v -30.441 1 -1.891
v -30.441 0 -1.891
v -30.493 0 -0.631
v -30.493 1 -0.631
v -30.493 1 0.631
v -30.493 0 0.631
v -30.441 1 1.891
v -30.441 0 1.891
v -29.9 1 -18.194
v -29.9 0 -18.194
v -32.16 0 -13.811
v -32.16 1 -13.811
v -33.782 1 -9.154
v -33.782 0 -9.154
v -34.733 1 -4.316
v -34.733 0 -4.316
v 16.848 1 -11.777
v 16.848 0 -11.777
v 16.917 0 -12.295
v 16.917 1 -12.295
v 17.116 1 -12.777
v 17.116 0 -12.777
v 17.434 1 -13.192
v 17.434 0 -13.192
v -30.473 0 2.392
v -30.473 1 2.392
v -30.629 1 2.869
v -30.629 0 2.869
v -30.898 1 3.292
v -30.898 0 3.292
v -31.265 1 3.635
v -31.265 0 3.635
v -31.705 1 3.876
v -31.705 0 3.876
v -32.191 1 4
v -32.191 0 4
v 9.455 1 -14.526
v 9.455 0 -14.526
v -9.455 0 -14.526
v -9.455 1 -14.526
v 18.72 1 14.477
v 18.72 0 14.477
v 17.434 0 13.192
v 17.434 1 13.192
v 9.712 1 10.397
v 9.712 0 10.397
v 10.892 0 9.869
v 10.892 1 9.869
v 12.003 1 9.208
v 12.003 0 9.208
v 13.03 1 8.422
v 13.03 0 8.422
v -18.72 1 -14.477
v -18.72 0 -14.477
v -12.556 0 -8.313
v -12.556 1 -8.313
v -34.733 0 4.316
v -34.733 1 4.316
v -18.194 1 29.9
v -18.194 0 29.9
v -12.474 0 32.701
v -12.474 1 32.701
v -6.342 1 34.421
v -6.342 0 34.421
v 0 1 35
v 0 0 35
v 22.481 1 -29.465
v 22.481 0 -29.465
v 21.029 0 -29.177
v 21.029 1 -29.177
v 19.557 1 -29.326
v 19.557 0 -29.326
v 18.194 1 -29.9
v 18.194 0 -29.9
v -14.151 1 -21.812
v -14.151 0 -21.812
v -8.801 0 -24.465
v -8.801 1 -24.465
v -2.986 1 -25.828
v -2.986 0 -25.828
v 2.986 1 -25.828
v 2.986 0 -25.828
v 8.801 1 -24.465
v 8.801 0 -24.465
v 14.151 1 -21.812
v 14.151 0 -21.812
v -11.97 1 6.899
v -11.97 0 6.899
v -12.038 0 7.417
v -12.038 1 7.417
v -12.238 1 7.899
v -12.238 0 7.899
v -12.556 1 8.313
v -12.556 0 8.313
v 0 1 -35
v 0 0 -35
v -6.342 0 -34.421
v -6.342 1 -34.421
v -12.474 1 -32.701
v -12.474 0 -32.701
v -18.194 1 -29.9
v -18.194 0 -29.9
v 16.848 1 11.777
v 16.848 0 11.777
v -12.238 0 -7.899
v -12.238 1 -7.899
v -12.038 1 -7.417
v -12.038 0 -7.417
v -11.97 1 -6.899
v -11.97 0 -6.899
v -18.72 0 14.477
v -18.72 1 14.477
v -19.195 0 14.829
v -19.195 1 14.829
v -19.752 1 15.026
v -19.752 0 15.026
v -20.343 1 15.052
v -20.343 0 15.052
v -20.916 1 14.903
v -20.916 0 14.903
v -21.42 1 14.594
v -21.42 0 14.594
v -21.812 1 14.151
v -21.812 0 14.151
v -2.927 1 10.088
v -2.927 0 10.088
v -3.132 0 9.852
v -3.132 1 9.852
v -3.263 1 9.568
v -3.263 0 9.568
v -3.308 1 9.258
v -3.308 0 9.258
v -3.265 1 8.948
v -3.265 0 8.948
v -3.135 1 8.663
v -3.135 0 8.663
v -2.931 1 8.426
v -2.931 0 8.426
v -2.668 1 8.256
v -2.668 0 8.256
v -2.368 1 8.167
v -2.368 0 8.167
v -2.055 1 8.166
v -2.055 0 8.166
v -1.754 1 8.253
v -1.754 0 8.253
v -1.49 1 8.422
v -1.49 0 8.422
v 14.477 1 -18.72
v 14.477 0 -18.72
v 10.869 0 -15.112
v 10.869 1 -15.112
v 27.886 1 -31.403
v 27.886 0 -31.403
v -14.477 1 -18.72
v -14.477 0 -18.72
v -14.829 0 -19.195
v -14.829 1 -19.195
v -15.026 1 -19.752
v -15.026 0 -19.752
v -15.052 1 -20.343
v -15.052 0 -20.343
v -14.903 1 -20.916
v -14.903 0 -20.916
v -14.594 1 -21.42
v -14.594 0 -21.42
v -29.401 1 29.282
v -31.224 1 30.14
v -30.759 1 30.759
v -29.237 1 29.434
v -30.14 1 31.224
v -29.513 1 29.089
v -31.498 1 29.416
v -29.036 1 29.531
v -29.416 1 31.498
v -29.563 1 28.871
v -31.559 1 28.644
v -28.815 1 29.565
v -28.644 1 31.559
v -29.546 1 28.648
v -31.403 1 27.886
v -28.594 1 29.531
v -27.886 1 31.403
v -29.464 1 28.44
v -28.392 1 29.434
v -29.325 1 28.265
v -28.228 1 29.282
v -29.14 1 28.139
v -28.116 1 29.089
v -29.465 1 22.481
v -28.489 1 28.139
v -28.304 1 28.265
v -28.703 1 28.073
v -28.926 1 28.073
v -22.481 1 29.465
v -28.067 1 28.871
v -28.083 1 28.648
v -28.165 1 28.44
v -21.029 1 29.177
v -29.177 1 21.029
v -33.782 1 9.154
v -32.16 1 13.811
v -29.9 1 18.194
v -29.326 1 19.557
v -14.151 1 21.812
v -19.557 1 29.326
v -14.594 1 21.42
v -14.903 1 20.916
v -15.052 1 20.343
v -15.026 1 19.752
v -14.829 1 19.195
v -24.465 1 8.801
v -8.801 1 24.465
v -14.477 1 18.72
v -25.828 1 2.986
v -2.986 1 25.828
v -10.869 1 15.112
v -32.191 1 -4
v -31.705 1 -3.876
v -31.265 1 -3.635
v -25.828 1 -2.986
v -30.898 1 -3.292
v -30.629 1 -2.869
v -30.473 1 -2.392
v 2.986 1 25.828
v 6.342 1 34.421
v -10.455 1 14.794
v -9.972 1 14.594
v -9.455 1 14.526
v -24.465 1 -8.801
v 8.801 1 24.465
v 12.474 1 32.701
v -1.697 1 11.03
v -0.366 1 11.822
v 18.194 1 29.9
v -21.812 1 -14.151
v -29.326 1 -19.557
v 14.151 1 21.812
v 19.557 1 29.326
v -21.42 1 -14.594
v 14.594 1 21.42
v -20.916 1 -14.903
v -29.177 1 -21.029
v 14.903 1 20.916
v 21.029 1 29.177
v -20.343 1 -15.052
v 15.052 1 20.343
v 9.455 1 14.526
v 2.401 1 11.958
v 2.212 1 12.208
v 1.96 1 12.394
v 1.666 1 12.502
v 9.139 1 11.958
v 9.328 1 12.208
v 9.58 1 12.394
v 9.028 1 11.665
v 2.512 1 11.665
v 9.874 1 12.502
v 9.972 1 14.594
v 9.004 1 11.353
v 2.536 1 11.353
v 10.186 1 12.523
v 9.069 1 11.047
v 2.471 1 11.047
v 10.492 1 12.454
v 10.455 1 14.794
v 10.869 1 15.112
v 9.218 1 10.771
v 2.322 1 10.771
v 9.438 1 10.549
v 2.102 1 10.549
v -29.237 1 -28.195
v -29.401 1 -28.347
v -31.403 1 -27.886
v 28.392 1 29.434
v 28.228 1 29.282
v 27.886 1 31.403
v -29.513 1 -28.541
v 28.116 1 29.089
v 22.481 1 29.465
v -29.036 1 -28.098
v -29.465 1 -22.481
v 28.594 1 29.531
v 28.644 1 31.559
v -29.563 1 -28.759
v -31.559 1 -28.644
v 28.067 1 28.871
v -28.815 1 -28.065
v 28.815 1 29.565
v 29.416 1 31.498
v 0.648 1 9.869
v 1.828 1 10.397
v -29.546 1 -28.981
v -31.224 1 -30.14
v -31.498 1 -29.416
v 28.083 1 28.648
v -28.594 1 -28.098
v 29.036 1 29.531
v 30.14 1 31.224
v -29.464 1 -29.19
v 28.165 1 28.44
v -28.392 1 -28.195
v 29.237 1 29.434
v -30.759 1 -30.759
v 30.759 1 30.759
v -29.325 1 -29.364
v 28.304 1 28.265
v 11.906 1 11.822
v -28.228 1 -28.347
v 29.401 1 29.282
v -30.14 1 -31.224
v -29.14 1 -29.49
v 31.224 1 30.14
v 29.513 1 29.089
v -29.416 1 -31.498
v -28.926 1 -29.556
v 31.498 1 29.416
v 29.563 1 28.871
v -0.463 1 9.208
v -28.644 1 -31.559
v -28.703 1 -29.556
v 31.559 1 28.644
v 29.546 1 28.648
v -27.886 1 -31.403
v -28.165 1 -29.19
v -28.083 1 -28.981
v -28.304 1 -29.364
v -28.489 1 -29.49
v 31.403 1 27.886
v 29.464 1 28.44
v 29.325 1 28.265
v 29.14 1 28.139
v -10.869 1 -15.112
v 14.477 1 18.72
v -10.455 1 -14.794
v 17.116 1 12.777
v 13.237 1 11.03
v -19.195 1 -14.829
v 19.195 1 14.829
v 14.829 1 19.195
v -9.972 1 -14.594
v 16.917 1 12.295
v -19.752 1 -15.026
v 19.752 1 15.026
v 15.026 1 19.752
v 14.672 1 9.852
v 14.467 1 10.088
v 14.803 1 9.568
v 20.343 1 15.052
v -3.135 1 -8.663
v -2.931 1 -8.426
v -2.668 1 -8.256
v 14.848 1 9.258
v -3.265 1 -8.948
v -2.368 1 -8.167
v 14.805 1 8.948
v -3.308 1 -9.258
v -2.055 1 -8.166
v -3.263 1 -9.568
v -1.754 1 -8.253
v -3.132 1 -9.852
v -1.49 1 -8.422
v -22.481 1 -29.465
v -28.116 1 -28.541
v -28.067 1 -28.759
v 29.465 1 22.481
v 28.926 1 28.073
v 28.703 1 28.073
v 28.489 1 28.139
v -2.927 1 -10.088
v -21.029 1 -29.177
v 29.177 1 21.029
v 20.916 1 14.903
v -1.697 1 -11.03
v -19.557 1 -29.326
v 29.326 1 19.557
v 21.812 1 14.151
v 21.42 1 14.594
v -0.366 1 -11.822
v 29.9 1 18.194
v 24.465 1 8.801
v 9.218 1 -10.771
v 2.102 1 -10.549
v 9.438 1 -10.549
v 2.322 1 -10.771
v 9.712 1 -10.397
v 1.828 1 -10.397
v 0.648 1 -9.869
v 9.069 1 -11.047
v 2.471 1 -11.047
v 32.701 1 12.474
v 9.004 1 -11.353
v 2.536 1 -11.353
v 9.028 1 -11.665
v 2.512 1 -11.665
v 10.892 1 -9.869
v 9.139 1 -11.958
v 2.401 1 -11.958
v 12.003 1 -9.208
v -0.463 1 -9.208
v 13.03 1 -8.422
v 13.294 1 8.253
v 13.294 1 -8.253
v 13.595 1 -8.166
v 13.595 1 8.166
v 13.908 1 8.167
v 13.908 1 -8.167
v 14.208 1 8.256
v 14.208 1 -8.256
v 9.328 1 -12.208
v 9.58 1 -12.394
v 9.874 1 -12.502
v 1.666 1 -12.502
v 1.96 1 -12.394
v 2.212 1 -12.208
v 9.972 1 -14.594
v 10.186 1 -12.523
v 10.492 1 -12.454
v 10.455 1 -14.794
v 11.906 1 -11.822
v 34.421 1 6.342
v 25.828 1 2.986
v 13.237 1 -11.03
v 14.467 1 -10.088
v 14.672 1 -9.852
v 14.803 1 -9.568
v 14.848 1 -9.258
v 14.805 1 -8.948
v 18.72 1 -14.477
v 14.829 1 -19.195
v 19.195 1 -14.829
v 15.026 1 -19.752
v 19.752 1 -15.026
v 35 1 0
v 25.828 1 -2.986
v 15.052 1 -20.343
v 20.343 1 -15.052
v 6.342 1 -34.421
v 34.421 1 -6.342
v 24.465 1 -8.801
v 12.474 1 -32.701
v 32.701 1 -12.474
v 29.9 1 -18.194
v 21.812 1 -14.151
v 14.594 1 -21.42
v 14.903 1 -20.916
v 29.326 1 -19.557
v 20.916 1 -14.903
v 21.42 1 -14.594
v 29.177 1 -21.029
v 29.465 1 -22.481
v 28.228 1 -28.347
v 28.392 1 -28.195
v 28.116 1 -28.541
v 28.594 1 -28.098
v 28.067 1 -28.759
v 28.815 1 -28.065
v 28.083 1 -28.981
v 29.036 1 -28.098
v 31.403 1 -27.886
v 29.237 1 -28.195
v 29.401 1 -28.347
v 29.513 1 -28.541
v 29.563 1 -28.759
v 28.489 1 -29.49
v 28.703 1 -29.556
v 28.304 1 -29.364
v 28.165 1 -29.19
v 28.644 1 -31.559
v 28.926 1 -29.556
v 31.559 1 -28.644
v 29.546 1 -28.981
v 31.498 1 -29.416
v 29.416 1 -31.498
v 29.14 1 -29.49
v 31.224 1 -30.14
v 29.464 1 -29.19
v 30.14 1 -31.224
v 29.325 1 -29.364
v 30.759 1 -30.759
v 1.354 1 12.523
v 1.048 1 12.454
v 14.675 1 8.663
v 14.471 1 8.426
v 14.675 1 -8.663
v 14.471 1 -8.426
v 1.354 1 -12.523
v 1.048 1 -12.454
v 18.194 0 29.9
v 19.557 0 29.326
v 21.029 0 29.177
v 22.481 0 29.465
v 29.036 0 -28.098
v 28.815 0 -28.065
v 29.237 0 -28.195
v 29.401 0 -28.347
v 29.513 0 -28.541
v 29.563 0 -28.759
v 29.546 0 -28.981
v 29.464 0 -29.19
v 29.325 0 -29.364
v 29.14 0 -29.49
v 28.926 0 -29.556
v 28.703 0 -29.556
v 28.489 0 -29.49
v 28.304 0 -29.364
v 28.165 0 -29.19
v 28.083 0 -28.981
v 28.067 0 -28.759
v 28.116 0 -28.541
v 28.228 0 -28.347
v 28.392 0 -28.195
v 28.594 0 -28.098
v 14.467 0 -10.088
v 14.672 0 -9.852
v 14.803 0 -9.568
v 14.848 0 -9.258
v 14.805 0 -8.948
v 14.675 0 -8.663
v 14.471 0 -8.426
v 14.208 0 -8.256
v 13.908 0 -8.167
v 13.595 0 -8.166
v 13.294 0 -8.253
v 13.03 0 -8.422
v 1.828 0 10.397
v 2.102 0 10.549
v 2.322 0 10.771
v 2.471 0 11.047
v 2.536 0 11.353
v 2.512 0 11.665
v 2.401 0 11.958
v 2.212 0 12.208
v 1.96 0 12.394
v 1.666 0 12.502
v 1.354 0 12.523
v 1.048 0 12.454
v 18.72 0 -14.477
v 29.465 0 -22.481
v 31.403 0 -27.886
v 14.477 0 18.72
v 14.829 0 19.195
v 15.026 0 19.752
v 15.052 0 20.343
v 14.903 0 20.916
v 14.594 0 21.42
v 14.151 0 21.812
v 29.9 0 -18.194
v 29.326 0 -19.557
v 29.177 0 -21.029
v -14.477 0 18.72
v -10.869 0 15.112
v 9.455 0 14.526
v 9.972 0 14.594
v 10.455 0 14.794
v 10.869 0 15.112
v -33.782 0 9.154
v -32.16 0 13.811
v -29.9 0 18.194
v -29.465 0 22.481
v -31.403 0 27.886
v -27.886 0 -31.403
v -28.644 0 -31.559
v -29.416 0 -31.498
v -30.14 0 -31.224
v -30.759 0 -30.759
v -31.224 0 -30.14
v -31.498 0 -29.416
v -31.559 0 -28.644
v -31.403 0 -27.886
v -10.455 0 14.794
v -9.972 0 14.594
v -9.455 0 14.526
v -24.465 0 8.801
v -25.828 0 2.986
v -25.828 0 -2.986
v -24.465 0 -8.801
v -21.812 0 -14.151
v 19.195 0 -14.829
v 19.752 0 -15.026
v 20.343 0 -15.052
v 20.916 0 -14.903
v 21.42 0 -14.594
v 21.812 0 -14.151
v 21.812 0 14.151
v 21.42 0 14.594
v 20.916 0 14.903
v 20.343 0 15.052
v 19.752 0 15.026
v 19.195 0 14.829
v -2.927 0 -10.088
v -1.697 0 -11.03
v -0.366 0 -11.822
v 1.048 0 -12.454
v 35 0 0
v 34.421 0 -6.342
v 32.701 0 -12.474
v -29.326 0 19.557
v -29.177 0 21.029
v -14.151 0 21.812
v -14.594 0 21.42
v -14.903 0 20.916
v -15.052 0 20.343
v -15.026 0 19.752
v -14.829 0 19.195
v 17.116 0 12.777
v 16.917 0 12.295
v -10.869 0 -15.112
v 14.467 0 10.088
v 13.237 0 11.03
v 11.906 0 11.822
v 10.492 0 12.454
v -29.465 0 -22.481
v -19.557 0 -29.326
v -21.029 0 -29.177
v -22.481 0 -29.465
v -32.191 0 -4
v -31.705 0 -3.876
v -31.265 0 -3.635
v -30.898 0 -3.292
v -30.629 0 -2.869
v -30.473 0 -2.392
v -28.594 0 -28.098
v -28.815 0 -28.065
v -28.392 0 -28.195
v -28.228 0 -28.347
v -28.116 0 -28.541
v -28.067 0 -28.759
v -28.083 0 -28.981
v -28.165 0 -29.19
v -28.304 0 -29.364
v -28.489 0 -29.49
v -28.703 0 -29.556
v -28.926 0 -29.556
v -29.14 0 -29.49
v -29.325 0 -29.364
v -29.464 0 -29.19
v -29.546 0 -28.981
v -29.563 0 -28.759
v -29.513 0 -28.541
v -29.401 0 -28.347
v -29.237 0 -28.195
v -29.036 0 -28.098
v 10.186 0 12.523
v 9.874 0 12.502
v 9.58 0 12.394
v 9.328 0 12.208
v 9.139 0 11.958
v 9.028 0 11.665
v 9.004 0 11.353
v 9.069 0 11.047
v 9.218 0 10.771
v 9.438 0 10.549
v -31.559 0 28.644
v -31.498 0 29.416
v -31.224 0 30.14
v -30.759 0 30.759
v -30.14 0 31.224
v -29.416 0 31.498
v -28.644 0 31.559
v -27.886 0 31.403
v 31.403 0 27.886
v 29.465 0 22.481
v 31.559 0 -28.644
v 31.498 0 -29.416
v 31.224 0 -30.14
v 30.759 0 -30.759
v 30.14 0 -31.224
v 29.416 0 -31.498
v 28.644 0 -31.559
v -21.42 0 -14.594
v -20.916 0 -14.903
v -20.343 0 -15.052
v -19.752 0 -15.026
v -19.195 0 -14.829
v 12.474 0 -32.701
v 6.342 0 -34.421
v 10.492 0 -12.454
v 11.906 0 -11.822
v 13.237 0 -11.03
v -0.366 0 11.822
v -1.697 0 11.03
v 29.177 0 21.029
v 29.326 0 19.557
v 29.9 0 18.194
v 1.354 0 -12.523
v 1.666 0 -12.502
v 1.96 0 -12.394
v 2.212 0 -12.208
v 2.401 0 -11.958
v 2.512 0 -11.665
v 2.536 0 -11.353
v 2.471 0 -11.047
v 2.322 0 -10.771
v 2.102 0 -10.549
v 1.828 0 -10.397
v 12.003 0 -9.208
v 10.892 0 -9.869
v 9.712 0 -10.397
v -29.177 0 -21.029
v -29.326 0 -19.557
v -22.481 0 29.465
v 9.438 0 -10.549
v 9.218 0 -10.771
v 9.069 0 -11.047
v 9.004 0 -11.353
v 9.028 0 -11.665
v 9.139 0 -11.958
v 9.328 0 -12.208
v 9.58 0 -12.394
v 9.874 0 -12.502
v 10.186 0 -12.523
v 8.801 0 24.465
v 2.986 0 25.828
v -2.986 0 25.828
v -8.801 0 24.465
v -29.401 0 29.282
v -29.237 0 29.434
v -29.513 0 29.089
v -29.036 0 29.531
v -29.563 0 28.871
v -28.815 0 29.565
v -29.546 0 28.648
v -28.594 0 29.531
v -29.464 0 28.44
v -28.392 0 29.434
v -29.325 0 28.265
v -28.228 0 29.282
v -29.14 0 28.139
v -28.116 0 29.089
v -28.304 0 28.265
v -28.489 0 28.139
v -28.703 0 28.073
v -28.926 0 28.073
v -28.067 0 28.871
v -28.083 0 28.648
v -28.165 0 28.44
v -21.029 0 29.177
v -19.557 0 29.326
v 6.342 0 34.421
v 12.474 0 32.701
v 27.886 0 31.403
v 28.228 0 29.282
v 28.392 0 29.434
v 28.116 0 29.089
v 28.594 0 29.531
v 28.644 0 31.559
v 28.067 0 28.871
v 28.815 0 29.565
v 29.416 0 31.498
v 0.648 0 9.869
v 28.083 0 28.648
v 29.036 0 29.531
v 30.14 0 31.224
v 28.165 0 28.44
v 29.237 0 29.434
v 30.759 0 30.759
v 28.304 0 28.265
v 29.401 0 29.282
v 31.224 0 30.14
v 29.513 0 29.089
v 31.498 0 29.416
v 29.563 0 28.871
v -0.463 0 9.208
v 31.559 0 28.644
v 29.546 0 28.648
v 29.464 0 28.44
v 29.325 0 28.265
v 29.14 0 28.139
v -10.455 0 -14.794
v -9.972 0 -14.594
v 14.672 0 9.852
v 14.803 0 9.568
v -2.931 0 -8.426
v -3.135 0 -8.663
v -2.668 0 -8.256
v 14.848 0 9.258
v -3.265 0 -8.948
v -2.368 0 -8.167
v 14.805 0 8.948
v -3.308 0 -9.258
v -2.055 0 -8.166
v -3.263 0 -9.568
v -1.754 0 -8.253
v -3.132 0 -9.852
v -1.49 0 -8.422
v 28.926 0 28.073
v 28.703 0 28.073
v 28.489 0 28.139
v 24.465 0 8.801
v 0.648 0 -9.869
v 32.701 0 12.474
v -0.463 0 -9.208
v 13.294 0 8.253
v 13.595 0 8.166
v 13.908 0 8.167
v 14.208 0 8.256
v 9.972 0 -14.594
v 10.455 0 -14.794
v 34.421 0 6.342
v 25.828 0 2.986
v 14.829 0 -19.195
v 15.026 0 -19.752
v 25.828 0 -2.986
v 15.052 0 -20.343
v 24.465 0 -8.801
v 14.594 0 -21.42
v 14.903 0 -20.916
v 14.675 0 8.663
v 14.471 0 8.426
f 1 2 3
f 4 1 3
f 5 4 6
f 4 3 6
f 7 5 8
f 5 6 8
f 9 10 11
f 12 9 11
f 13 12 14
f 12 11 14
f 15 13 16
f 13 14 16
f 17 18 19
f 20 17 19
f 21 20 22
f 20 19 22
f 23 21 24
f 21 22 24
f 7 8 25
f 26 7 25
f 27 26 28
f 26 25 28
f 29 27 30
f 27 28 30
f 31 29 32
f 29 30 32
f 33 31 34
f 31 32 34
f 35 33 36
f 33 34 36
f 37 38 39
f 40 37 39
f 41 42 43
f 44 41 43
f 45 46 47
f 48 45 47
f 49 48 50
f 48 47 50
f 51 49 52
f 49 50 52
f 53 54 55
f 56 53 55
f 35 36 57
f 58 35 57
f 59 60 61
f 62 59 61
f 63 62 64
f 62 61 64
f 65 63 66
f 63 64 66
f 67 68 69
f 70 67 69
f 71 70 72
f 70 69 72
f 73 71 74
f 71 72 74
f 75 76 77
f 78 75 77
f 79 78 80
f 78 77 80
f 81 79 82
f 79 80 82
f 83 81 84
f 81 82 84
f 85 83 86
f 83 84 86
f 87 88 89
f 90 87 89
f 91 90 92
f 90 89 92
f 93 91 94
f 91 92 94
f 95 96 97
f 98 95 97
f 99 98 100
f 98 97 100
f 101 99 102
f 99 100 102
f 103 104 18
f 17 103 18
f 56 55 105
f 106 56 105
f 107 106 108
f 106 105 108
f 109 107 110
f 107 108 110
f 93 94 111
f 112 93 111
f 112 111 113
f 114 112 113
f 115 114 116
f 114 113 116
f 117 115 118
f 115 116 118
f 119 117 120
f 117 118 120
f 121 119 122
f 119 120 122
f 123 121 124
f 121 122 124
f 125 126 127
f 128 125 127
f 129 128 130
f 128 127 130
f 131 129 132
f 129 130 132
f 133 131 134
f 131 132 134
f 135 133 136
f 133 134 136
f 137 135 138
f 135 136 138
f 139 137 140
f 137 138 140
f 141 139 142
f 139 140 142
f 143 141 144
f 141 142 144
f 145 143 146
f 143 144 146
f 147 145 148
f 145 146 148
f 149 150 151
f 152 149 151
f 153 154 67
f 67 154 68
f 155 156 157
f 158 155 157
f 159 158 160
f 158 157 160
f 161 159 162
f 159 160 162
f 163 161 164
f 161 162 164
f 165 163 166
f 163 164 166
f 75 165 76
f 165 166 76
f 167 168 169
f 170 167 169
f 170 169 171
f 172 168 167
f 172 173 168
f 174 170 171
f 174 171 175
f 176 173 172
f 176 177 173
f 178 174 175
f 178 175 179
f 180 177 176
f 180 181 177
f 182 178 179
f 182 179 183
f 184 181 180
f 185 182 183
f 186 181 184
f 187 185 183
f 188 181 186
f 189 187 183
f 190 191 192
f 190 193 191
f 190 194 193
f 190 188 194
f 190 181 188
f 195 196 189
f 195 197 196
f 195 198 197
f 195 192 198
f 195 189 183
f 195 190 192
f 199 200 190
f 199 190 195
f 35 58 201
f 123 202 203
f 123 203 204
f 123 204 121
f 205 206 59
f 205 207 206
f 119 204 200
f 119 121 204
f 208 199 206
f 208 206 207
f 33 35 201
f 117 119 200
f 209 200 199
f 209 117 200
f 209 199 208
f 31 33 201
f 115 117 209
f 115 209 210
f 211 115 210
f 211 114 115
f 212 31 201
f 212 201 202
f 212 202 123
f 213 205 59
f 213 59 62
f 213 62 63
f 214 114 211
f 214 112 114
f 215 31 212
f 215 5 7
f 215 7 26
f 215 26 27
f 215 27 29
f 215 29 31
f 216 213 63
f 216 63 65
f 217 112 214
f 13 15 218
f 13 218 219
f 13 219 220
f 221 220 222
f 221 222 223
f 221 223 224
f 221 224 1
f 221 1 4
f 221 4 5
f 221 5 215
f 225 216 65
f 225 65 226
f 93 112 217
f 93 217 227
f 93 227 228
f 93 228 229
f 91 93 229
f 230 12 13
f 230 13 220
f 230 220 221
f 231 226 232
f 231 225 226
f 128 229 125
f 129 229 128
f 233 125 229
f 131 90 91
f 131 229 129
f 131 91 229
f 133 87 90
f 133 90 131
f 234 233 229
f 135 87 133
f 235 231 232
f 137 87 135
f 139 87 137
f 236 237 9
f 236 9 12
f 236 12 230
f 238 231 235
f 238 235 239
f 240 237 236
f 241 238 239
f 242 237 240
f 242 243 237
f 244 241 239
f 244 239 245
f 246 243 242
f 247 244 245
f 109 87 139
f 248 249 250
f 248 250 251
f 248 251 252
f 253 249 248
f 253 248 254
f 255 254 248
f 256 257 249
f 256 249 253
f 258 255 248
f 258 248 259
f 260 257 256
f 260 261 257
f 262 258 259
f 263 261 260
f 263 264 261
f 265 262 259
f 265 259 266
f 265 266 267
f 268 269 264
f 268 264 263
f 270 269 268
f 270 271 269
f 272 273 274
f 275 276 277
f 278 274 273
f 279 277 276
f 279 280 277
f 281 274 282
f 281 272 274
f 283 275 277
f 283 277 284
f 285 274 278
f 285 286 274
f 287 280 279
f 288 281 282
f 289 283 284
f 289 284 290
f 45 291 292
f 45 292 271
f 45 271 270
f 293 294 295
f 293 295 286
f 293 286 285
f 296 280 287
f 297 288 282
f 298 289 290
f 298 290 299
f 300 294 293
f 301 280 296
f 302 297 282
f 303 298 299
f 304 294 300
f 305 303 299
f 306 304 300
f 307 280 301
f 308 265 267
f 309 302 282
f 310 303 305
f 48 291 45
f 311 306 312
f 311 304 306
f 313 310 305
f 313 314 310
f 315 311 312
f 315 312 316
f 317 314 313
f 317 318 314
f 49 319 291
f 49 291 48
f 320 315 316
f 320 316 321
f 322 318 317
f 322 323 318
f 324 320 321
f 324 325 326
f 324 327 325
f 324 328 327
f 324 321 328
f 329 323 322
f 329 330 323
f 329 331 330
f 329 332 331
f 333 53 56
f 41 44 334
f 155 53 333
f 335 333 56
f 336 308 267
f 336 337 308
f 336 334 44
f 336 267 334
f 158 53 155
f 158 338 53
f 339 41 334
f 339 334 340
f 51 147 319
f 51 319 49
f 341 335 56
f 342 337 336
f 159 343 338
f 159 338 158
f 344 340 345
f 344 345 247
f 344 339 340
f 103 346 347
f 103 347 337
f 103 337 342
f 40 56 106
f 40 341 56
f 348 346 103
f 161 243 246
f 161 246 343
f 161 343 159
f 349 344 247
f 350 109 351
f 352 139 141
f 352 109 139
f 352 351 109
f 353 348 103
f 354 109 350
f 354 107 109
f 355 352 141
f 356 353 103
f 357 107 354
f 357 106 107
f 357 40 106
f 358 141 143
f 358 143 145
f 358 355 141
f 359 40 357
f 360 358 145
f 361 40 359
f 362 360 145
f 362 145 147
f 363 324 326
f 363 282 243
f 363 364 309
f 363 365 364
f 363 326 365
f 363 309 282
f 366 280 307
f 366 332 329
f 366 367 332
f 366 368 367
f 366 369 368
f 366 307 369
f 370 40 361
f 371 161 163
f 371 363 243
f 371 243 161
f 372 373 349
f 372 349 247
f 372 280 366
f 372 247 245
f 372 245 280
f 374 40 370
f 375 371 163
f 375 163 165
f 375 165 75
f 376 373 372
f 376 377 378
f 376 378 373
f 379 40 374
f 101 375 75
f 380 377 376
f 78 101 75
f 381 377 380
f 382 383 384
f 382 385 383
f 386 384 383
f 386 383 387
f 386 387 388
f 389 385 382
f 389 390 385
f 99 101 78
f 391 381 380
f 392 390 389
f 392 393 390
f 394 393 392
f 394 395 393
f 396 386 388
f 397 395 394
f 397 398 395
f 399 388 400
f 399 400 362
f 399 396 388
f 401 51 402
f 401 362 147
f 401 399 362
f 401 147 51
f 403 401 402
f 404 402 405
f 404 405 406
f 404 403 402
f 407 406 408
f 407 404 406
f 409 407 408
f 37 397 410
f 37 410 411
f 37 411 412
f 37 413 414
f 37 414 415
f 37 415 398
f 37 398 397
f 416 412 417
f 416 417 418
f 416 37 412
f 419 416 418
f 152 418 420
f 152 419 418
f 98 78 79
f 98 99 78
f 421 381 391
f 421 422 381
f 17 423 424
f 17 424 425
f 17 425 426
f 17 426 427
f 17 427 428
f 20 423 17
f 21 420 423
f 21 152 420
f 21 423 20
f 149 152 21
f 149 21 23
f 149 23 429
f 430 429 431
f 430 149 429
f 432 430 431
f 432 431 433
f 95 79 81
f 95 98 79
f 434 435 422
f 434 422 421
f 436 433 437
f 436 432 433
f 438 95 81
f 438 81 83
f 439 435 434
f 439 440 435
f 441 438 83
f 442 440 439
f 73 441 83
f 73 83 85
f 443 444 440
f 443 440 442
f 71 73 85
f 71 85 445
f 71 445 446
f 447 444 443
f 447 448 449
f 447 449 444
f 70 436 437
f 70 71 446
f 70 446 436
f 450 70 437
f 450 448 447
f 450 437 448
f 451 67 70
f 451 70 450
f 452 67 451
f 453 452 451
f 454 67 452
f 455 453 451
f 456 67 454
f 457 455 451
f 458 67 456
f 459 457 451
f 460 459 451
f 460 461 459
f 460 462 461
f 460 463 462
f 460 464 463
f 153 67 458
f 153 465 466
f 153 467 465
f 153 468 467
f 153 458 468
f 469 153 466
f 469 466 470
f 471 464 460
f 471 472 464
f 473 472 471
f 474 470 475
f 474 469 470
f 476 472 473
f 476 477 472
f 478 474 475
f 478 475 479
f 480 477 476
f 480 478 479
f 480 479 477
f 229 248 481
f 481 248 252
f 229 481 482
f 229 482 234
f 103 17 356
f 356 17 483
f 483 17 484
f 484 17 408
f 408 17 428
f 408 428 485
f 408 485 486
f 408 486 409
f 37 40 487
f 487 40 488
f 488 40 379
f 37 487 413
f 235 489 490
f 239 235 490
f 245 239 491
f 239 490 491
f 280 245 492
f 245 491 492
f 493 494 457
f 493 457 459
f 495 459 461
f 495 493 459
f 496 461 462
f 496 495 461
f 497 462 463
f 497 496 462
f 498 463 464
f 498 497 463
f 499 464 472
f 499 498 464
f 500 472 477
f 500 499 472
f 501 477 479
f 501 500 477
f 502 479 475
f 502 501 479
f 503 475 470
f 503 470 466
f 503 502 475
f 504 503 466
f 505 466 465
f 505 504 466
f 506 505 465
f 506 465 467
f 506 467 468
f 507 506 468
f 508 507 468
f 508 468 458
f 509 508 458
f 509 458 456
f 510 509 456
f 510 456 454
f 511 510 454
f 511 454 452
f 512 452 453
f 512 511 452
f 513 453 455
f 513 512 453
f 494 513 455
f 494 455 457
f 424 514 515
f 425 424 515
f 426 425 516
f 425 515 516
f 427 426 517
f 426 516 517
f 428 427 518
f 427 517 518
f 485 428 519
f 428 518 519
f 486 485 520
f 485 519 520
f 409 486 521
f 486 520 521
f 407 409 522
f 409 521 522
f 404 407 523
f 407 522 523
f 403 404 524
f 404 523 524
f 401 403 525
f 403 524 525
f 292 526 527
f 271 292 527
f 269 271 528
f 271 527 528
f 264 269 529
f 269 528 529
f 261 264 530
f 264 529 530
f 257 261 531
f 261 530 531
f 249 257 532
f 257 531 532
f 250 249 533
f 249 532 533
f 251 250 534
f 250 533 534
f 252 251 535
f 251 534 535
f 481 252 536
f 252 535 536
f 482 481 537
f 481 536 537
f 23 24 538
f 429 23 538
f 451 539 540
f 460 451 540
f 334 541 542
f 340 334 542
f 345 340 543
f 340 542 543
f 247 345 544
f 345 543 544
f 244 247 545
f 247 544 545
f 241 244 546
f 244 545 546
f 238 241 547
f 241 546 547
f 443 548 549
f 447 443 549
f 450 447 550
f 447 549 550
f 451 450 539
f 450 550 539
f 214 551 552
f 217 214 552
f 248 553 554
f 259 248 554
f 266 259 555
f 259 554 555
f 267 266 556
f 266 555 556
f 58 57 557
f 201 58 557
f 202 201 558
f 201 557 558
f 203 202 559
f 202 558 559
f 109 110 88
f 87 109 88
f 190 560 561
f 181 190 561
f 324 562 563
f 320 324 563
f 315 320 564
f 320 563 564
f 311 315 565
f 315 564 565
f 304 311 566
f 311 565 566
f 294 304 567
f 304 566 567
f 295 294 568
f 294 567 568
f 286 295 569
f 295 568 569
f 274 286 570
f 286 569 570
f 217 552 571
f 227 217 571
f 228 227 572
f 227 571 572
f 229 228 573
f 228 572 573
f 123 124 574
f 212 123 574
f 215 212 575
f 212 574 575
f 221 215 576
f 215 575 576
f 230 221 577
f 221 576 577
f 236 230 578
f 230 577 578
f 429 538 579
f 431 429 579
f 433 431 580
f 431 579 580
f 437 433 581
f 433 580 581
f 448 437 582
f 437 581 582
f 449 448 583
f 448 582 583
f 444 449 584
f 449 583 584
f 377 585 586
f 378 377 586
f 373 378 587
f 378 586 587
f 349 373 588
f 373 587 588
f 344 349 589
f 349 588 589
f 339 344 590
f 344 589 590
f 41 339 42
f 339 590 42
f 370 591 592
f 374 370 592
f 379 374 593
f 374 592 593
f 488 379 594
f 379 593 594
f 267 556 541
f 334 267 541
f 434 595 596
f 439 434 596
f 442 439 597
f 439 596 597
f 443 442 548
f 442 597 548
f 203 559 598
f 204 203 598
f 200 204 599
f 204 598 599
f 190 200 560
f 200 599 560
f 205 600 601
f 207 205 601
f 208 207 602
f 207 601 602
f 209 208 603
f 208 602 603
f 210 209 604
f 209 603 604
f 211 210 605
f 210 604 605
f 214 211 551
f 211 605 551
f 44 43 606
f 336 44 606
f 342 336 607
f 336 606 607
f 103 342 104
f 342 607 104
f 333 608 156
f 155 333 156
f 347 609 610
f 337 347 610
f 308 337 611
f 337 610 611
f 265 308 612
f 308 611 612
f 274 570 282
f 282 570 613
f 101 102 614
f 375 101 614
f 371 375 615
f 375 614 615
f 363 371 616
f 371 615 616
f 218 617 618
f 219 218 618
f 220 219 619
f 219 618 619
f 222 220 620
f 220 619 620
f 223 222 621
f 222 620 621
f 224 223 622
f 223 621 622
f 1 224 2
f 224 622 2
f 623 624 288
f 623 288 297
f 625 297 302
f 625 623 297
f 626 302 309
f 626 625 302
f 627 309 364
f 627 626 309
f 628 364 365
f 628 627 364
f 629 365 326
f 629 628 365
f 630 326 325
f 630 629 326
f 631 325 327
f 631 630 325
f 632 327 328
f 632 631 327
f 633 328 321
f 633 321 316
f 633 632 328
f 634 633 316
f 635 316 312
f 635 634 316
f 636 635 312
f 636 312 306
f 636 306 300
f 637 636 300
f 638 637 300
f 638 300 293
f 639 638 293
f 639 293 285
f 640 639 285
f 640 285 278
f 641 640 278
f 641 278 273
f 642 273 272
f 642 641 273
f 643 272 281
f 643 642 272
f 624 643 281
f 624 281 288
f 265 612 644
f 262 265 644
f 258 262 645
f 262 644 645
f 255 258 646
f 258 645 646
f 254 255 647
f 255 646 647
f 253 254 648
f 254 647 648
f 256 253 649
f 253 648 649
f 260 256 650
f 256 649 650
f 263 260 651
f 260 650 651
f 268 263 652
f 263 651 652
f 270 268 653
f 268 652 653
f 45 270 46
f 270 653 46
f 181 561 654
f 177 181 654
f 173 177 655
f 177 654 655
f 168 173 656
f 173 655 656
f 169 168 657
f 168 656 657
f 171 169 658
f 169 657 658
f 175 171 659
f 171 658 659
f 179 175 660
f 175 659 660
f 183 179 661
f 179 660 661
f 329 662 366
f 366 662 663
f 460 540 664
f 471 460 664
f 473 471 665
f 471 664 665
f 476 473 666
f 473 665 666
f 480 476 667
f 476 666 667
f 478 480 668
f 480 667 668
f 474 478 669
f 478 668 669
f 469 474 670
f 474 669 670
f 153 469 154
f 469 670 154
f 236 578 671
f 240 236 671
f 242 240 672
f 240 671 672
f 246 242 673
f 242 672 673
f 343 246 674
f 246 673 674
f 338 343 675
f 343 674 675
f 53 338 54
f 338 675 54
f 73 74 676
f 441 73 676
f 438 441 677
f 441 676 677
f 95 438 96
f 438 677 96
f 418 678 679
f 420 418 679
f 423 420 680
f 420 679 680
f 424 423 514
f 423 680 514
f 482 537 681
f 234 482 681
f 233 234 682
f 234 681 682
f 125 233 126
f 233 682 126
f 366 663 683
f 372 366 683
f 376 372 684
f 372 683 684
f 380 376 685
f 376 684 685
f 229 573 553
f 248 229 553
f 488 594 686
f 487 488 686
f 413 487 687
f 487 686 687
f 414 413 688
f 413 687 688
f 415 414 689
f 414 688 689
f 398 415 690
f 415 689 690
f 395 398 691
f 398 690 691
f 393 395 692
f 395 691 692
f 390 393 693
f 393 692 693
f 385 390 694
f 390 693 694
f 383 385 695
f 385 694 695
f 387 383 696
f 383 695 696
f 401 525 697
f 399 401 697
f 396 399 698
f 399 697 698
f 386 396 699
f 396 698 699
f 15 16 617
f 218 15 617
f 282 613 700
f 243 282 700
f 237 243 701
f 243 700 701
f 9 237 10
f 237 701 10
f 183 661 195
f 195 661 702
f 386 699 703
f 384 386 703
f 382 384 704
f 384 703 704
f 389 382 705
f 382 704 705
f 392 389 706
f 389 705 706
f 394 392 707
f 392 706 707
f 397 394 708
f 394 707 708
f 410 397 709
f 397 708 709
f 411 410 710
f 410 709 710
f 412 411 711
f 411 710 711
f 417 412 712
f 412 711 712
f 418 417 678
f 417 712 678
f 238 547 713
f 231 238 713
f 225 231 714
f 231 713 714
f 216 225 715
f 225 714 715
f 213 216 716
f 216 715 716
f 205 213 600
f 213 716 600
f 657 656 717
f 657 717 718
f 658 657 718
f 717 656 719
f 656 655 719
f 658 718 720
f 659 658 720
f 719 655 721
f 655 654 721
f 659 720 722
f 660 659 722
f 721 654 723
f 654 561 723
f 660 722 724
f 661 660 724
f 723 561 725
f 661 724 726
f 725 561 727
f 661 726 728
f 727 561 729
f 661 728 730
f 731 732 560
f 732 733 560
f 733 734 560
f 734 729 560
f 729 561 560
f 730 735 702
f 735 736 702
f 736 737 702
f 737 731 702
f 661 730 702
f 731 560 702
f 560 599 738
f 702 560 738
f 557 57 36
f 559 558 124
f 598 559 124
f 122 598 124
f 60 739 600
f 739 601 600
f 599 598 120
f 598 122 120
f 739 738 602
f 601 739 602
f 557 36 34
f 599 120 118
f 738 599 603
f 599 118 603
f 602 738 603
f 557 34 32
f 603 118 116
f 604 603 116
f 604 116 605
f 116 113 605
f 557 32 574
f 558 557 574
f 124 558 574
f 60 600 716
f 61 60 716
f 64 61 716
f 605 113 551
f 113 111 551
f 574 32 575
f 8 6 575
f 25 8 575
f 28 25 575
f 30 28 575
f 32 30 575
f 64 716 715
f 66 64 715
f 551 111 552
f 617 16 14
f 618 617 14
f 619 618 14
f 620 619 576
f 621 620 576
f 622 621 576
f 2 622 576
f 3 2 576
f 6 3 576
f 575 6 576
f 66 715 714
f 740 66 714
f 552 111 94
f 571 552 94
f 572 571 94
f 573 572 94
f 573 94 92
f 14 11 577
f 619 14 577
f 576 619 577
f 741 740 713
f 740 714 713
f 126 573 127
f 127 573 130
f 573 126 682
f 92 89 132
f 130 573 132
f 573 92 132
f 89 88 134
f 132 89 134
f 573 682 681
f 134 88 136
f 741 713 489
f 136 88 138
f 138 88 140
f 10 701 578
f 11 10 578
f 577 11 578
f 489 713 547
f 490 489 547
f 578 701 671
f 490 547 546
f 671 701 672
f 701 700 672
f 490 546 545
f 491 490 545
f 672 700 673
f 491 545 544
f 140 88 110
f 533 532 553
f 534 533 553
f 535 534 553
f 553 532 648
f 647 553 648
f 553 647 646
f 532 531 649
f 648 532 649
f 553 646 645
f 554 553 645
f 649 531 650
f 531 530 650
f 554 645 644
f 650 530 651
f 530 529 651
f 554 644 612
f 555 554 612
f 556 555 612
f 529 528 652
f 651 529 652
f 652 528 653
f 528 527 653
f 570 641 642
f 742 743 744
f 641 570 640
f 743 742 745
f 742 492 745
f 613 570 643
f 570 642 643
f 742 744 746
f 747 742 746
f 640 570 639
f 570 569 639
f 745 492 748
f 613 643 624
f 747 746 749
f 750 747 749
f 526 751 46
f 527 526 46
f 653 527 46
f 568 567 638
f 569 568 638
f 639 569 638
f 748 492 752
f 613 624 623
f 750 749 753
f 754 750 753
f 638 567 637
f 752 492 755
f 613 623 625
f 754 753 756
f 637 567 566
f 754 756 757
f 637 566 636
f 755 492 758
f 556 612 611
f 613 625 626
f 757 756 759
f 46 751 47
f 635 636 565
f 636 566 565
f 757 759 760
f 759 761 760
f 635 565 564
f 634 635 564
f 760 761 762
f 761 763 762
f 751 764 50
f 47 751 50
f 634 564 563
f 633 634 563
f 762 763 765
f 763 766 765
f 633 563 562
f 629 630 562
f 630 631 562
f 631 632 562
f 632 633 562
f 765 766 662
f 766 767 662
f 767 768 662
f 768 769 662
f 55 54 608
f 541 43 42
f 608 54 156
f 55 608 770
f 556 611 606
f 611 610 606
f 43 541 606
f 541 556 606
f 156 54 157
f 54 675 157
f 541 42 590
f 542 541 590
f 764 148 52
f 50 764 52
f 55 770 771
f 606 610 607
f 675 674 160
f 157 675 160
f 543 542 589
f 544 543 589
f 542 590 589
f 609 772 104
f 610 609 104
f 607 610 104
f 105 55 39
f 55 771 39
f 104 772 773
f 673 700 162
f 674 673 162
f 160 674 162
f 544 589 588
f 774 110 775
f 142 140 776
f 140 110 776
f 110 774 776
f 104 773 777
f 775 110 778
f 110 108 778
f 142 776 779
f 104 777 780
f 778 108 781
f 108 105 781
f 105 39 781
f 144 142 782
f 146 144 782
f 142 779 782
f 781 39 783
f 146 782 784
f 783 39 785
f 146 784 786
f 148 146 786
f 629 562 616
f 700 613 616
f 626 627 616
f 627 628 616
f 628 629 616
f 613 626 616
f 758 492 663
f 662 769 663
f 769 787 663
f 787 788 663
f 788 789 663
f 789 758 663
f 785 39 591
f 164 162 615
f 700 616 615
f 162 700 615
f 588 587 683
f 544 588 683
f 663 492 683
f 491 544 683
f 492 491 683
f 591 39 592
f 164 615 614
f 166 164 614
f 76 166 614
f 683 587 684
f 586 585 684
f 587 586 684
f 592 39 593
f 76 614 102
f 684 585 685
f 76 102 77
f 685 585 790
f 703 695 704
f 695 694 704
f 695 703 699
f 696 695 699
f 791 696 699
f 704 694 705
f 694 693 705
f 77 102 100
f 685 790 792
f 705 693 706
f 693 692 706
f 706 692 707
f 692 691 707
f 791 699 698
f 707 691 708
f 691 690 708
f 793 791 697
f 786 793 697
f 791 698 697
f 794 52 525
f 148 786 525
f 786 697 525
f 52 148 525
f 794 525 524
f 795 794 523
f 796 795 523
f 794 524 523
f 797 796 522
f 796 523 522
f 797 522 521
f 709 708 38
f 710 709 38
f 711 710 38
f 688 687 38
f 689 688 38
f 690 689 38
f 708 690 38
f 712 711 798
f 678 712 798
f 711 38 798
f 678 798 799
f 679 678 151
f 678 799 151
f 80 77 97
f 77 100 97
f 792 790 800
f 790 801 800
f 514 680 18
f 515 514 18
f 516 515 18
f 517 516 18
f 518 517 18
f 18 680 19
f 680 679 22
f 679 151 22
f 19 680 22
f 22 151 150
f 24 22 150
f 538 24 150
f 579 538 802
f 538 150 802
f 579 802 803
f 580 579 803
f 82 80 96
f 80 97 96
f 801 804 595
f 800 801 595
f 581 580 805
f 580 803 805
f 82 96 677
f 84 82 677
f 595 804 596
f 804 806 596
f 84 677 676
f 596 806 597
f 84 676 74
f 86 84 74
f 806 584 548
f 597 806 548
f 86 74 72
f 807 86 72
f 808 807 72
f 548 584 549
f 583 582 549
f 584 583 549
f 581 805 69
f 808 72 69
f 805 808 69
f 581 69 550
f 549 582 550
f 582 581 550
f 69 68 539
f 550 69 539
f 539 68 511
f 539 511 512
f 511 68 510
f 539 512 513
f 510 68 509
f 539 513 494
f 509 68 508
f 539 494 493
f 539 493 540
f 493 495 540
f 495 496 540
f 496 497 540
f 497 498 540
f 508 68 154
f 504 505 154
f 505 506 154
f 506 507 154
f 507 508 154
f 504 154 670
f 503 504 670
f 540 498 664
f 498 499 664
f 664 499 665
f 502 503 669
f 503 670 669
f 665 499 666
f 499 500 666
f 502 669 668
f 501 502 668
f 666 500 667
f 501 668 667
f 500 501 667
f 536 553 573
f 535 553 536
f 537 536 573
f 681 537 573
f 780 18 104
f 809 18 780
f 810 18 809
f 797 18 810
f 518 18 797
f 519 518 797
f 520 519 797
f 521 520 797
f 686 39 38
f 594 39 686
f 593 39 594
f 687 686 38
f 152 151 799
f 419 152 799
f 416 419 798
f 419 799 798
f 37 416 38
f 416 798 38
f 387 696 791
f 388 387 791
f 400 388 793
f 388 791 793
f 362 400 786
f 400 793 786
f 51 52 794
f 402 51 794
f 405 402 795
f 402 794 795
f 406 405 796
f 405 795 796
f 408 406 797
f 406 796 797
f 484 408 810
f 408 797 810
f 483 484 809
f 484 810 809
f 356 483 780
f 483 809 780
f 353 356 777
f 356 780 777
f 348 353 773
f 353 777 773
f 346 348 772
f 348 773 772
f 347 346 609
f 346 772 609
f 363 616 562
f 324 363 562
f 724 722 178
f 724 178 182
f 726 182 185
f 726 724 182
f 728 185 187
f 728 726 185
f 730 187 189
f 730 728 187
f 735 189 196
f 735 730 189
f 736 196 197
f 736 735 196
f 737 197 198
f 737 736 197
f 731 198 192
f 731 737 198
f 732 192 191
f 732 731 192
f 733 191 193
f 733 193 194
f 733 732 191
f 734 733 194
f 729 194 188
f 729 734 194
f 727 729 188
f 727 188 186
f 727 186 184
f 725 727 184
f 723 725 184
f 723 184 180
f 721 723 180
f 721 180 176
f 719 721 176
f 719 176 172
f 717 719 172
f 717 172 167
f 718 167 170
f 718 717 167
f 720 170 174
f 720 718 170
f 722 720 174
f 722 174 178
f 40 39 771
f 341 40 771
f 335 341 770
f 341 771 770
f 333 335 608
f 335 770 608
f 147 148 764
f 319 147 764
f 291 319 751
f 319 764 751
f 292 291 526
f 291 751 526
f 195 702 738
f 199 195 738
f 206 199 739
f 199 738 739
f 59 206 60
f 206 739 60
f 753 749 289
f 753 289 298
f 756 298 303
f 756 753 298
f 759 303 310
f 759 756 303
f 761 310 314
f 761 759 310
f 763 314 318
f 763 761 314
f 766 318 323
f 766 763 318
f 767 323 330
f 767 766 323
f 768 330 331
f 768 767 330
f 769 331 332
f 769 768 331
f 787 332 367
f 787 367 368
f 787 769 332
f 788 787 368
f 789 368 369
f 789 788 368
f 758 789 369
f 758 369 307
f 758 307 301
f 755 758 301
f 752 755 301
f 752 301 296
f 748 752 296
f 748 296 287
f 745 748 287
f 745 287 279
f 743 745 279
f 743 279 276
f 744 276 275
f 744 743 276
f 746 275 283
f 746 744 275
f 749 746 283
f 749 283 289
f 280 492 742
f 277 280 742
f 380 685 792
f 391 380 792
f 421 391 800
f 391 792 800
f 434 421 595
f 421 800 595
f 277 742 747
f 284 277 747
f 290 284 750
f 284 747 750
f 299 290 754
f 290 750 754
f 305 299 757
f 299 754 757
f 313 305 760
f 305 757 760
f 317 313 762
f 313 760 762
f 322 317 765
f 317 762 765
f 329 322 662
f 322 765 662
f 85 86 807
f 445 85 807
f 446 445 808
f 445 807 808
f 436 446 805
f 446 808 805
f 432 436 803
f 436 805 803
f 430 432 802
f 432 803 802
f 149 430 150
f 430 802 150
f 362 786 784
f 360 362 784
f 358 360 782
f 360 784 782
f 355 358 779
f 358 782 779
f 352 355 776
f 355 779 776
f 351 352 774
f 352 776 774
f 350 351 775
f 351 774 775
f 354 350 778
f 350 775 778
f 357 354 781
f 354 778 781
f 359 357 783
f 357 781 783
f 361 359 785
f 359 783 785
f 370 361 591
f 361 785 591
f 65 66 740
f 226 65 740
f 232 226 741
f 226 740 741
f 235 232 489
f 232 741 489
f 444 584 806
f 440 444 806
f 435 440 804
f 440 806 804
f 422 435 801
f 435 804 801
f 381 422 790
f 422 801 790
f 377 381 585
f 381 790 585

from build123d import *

# Parameters (mm, degrees)
SKETCH_1_R      = 0.75
EXTRUDE_1_DEPTH = 1


with BuildPart() as part:
    # 草图1 → 凸台-拉伸1 (new body)
    with BuildSketch(Plane(origin=(0, 0, 0), x_dir=(1, 0, 0), z_dir=(0, 1, 0))):
        with BuildLine():
            Line((29.46455474, 22.480687159), (31.403167944, 27.886257161))
            ThreePointArc((31.403167944, 27.886257161), (30.759144982, 30.759144982), (27.886257161, 31.403167944))
            Line((27.886257161, 31.403167944), (22.480687159, 29.46455474))
            ThreePointArc((22.480687159, 29.46455474), (20.287911996, 29.196594839), (18.19369008, 29.899659551))
            ThreePointArc((18.19369008, 29.899659551), (9.447537132, 33.700801803), (0, 35))
            ThreePointArc((0, 35), (-9.447537132, 33.700801803), (-18.19369008, 29.899659551))
            ThreePointArc((-18.19369008, 29.899659551), (-20.287911996, 29.196594839), (-22.480687159, 29.46455474))
            Line((-22.480687159, 29.46455474), (-27.886257161, 31.403167944))
            ThreePointArc((-27.886257161, 31.403167944), (-30.759144982, 30.759144982), (-31.403167944, 27.886257161))
            Line((-31.403167944, 27.886257161), (-29.46455474, 22.480687159))
            ThreePointArc((-29.46455474, 22.480687159), (-29.196594839, 20.287911996), (-29.899659551, 18.19369008))
            ThreePointArc((-29.899659551, 18.19369008), (-33.052834782, 11.511303701), (-34.732884242, 4.315872125))
            Line((-34.732884242, 4.315872125), (-32.190837206, 4))
            ThreePointArc((-32.190837206, 4), (-30.89823255, 3.292285123), (-30.441307179, 1.891247526))
            ThreePointArc((-30.441307179, 1.891247526), (-30.5, 0), (-30.441307179, -1.891247526))
            ThreePointArc((-30.441307179, -1.891247526), (-30.89823255, -3.292285123), (-32.190837206, -4))
            Line((-32.190837206, -4), (-34.732884242, -4.315872125))
            ThreePointArc((-34.732884242, -4.315872125), (-33.052834782, -11.511303701), (-29.899659551, -18.19369008))
            ThreePointArc((-29.899659551, -18.19369008), (-29.196594839, -20.287911996), (-29.46455474, -22.480687159))
            Line((-29.46455474, -22.480687159), (-31.403167944, -27.886257161))
            ThreePointArc((-31.403167944, -27.886257161), (-30.759144982, -30.759144982), (-27.886257161, -31.403167944))
            Line((-27.886257161, -31.403167944), (-22.480687159, -29.46455474))
            ThreePointArc((-22.480687159, -29.46455474), (-20.287911996, -29.196594839), (-18.19369008, -29.899659551))
            ThreePointArc((-18.19369008, -29.899659551), (-9.447537132, -33.700801803), (0, -35))
            ThreePointArc((0, -35), (9.447537132, -33.700801803), (18.19369008, -29.899659551))
            ThreePointArc((18.19369008, -29.899659551), (20.287911996, -29.196594839), (22.480687159, -29.46455474))
            Line((22.480687159, -29.46455474), (27.886257161, -31.403167944))
            ThreePointArc((27.886257161, -31.403167944), (30.759144982, -30.759144982), (31.403167944, -27.886257161))
            Line((31.403167944, -27.886257161), (29.46455474, -22.480687159))
            ThreePointArc((29.46455474, -22.480687159), (29.196594839, -20.287911996), (29.899659551, -18.19369008))
            ThreePointArc((29.899659551, -18.19369008), (33.700801803, -9.447537132), (35, 0))
            ThreePointArc((35, 0), (33.700801803, 9.447537132), (29.899659551, 18.19369008))
            ThreePointArc((29.899659551, 18.19369008), (29.196594839, 20.287911996), (29.46455474, 22.480687159))
        make_face()
        with Locations(Location((-28.814601333, -28.814601333, 0), (0, 0, 270))):
            Circle(SKETCH_1_R, mode=Mode.SUBTRACT)
        with BuildLine():
            Line((-14.476872329, -18.719513016), (-10.868928268, -15.111568955))
            ThreePointArc((-10.868928268, -15.111568955), (-10.22008157, -14.678023452), (-9.454714705, -14.525782517))
            Line((-9.454714705, -14.525782517), (9.454714705, -14.525782517))
            ThreePointArc((9.454714705, -14.525782517), (10.22008157, -14.678023452), (10.868928268, -15.111568955))
            Line((10.868928268, -15.111568955), (14.476872329, -18.719513016))
            ThreePointArc((14.476872329, -18.719513016), (15.051657451, -20.343212221), (14.151213664, -21.811537127))
            ThreePointArc((14.151213664, -21.811537127), (0, -26), (-14.151213664, -21.811537127))
            ThreePointArc((-14.151213664, -21.811537127), (-15.051657451, -20.343212221), (-14.476872329, -18.719513016))
        make_face(mode=Mode.SUBTRACT)
        with BuildLine():
            ThreePointArc((1.828205899, -10.397220329), (2.466819597, -11.815731007), (1.048308919, -12.454344705))
            ThreePointArc((1.048308919, -12.454344705), (-1.042632246, -11.445222173), (-2.926575027, -10.088342356))
            ThreePointArc((-2.926575027, -10.088342356), (-3.041516382, -8.536959591), (-1.490133616, -8.422018236))
            ThreePointArc((-1.490133616, -8.422018236), (0.082632246, -9.554777827), (1.828205899, -10.397220329))
        make_face(mode=Mode.SUBTRACT)
        with Locations(Location((28.814601333, -28.814601333, 0), (0, 0, 270))):
            Circle(SKETCH_1_R, mode=Mode.SUBTRACT)
        with BuildLine():
            ThreePointArc((14.466575027, -10.088342356), (12.582632246, -11.445222173), (10.491691081, -12.454344705))
            ThreePointArc((10.491691081, -12.454344705), (9.073180403, -11.815731007), (9.711794101, -10.397220329))
            ThreePointArc((9.711794101, -10.397220329), (11.457367754, -9.554777827), (13.030133616, -8.422018236))
            ThreePointArc((13.030133616, -8.422018236), (14.581516382, -8.536959591), (14.466575027, -10.088342356))
        make_face(mode=Mode.SUBTRACT)
        with BuildLine():
            Line((-11.97, 6.898932188), (-11.97, -6.898932188))
            ThreePointArc((-11.97, -6.898932188), (-12.122240935, -7.664299053), (-12.555786438, -8.313145751))
            Line((-12.555786438, -8.313145751), (-18.719513016, -14.476872329))
            ThreePointArc((-18.719513016, -14.476872329), (-20.343212221, -15.051657451), (-21.811537127, -14.151213664))
            ThreePointArc((-21.811537127, -14.151213664), (-26, 0), (-21.811537127, 14.151213664))
            ThreePointArc((-21.811537127, 14.151213664), (-20.343212221, 15.051657451), (-18.719513016, 14.476872329))
            Line((-18.719513016, 14.476872329), (-12.555786438, 8.313145751))
            ThreePointArc((-12.555786438, 8.313145751), (-12.122240935, 7.664299053), (-11.97, 6.898932188))
        make_face(mode=Mode.SUBTRACT)
        with BuildLine():
            ThreePointArc((-2.926575027, 10.088342356), (-1.042632246, 11.445222173), (1.048308919, 12.454344705))
            ThreePointArc((1.048308919, 12.454344705), (2.466819597, 11.815731007), (1.828205899, 10.397220329))
            ThreePointArc((1.828205899, 10.397220329), (0.082632246, 9.554777827), (-1.490133616, 8.422018236))
            ThreePointArc((-1.490133616, 8.422018236), (-3.041516382, 8.536959591), (-2.926575027, 10.088342356))
        make_face(mode=Mode.SUBTRACT)
        with Locations(Location((-28.814601333, 28.814601333, 0), (0, 0, 270))):
            Circle(SKETCH_1_R, mode=Mode.SUBTRACT)
        with BuildLine():
            ThreePointArc((10.868928268, 15.111568955), (10.22008157, 14.678023452), (9.454714705, 14.525782517))
            Line((9.454714705, 14.525782517), (-9.454714705, 14.525782517))
            ThreePointArc((-9.454714705, 14.525782517), (-10.22008157, 14.678023452), (-10.868928268, 15.111568955))
            Line((-10.868928268, 15.111568955), (-14.476872329, 18.719513016))
            ThreePointArc((-14.476872329, 18.719513016), (-15.051657451, 20.343212221), (-14.151213664, 21.811537127))
            ThreePointArc((-14.151213664, 21.811537127), (0, 26), (14.151213664, 21.811537127))
            ThreePointArc((14.151213664, 21.811537127), (15.051657451, 20.343212221), (14.476872329, 18.719513016))
            Line((14.476872329, 18.719513016), (10.868928268, 15.111568955))
        make_face(mode=Mode.SUBTRACT)
        with BuildLine():
            ThreePointArc((9.711794101, 10.397220329), (9.073180403, 11.815731007), (10.491691081, 12.454344705))
            ThreePointArc((10.491691081, 12.454344705), (12.582632246, 11.445222173), (14.466575027, 10.088342356))
            ThreePointArc((14.466575027, 10.088342356), (14.581516382, 8.536959591), (13.030133616, 8.422018236))
            ThreePointArc((13.030133616, 8.422018236), (11.457367754, 9.554777827), (9.711794101, 10.397220329))
        make_face(mode=Mode.SUBTRACT)
        with BuildLine():
            ThreePointArc((21.811537127, -14.151213664), (20.343212221, -15.051657451), (18.719513016, -14.476872329))
            Line((18.719513016, -14.476872329), (17.434140759, -13.191500072))
            ThreePointArc((17.434140759, -13.191500072), (17.000595257, -12.542653375), (16.848354322, -11.77728651))
            Line((16.848354322, -11.77728651), (16.848354322, 11.77728651))
            ThreePointArc((16.848354322, 11.77728651), (17.000595257, 12.542653375), (17.434140759, 13.191500072))
            Line((17.434140759, 13.191500072), (18.719513016, 14.476872329))
            ThreePointArc((18.719513016, 14.476872329), (20.343212221, 15.051657451), (21.811537127, 14.151213664))
            ThreePointArc((21.811537127, 14.151213664), (26, 0), (21.811537127, -14.151213664))
        make_face(mode=Mode.SUBTRACT)
        with Locations(Location((28.814601333, 28.814601333, 0), (0, 0, 270))):
            Circle(SKETCH_1_R, mode=Mode.SUBTRACT)
    extrude(amount=EXTRUDE_1_DEPTH)


solid = part.part
